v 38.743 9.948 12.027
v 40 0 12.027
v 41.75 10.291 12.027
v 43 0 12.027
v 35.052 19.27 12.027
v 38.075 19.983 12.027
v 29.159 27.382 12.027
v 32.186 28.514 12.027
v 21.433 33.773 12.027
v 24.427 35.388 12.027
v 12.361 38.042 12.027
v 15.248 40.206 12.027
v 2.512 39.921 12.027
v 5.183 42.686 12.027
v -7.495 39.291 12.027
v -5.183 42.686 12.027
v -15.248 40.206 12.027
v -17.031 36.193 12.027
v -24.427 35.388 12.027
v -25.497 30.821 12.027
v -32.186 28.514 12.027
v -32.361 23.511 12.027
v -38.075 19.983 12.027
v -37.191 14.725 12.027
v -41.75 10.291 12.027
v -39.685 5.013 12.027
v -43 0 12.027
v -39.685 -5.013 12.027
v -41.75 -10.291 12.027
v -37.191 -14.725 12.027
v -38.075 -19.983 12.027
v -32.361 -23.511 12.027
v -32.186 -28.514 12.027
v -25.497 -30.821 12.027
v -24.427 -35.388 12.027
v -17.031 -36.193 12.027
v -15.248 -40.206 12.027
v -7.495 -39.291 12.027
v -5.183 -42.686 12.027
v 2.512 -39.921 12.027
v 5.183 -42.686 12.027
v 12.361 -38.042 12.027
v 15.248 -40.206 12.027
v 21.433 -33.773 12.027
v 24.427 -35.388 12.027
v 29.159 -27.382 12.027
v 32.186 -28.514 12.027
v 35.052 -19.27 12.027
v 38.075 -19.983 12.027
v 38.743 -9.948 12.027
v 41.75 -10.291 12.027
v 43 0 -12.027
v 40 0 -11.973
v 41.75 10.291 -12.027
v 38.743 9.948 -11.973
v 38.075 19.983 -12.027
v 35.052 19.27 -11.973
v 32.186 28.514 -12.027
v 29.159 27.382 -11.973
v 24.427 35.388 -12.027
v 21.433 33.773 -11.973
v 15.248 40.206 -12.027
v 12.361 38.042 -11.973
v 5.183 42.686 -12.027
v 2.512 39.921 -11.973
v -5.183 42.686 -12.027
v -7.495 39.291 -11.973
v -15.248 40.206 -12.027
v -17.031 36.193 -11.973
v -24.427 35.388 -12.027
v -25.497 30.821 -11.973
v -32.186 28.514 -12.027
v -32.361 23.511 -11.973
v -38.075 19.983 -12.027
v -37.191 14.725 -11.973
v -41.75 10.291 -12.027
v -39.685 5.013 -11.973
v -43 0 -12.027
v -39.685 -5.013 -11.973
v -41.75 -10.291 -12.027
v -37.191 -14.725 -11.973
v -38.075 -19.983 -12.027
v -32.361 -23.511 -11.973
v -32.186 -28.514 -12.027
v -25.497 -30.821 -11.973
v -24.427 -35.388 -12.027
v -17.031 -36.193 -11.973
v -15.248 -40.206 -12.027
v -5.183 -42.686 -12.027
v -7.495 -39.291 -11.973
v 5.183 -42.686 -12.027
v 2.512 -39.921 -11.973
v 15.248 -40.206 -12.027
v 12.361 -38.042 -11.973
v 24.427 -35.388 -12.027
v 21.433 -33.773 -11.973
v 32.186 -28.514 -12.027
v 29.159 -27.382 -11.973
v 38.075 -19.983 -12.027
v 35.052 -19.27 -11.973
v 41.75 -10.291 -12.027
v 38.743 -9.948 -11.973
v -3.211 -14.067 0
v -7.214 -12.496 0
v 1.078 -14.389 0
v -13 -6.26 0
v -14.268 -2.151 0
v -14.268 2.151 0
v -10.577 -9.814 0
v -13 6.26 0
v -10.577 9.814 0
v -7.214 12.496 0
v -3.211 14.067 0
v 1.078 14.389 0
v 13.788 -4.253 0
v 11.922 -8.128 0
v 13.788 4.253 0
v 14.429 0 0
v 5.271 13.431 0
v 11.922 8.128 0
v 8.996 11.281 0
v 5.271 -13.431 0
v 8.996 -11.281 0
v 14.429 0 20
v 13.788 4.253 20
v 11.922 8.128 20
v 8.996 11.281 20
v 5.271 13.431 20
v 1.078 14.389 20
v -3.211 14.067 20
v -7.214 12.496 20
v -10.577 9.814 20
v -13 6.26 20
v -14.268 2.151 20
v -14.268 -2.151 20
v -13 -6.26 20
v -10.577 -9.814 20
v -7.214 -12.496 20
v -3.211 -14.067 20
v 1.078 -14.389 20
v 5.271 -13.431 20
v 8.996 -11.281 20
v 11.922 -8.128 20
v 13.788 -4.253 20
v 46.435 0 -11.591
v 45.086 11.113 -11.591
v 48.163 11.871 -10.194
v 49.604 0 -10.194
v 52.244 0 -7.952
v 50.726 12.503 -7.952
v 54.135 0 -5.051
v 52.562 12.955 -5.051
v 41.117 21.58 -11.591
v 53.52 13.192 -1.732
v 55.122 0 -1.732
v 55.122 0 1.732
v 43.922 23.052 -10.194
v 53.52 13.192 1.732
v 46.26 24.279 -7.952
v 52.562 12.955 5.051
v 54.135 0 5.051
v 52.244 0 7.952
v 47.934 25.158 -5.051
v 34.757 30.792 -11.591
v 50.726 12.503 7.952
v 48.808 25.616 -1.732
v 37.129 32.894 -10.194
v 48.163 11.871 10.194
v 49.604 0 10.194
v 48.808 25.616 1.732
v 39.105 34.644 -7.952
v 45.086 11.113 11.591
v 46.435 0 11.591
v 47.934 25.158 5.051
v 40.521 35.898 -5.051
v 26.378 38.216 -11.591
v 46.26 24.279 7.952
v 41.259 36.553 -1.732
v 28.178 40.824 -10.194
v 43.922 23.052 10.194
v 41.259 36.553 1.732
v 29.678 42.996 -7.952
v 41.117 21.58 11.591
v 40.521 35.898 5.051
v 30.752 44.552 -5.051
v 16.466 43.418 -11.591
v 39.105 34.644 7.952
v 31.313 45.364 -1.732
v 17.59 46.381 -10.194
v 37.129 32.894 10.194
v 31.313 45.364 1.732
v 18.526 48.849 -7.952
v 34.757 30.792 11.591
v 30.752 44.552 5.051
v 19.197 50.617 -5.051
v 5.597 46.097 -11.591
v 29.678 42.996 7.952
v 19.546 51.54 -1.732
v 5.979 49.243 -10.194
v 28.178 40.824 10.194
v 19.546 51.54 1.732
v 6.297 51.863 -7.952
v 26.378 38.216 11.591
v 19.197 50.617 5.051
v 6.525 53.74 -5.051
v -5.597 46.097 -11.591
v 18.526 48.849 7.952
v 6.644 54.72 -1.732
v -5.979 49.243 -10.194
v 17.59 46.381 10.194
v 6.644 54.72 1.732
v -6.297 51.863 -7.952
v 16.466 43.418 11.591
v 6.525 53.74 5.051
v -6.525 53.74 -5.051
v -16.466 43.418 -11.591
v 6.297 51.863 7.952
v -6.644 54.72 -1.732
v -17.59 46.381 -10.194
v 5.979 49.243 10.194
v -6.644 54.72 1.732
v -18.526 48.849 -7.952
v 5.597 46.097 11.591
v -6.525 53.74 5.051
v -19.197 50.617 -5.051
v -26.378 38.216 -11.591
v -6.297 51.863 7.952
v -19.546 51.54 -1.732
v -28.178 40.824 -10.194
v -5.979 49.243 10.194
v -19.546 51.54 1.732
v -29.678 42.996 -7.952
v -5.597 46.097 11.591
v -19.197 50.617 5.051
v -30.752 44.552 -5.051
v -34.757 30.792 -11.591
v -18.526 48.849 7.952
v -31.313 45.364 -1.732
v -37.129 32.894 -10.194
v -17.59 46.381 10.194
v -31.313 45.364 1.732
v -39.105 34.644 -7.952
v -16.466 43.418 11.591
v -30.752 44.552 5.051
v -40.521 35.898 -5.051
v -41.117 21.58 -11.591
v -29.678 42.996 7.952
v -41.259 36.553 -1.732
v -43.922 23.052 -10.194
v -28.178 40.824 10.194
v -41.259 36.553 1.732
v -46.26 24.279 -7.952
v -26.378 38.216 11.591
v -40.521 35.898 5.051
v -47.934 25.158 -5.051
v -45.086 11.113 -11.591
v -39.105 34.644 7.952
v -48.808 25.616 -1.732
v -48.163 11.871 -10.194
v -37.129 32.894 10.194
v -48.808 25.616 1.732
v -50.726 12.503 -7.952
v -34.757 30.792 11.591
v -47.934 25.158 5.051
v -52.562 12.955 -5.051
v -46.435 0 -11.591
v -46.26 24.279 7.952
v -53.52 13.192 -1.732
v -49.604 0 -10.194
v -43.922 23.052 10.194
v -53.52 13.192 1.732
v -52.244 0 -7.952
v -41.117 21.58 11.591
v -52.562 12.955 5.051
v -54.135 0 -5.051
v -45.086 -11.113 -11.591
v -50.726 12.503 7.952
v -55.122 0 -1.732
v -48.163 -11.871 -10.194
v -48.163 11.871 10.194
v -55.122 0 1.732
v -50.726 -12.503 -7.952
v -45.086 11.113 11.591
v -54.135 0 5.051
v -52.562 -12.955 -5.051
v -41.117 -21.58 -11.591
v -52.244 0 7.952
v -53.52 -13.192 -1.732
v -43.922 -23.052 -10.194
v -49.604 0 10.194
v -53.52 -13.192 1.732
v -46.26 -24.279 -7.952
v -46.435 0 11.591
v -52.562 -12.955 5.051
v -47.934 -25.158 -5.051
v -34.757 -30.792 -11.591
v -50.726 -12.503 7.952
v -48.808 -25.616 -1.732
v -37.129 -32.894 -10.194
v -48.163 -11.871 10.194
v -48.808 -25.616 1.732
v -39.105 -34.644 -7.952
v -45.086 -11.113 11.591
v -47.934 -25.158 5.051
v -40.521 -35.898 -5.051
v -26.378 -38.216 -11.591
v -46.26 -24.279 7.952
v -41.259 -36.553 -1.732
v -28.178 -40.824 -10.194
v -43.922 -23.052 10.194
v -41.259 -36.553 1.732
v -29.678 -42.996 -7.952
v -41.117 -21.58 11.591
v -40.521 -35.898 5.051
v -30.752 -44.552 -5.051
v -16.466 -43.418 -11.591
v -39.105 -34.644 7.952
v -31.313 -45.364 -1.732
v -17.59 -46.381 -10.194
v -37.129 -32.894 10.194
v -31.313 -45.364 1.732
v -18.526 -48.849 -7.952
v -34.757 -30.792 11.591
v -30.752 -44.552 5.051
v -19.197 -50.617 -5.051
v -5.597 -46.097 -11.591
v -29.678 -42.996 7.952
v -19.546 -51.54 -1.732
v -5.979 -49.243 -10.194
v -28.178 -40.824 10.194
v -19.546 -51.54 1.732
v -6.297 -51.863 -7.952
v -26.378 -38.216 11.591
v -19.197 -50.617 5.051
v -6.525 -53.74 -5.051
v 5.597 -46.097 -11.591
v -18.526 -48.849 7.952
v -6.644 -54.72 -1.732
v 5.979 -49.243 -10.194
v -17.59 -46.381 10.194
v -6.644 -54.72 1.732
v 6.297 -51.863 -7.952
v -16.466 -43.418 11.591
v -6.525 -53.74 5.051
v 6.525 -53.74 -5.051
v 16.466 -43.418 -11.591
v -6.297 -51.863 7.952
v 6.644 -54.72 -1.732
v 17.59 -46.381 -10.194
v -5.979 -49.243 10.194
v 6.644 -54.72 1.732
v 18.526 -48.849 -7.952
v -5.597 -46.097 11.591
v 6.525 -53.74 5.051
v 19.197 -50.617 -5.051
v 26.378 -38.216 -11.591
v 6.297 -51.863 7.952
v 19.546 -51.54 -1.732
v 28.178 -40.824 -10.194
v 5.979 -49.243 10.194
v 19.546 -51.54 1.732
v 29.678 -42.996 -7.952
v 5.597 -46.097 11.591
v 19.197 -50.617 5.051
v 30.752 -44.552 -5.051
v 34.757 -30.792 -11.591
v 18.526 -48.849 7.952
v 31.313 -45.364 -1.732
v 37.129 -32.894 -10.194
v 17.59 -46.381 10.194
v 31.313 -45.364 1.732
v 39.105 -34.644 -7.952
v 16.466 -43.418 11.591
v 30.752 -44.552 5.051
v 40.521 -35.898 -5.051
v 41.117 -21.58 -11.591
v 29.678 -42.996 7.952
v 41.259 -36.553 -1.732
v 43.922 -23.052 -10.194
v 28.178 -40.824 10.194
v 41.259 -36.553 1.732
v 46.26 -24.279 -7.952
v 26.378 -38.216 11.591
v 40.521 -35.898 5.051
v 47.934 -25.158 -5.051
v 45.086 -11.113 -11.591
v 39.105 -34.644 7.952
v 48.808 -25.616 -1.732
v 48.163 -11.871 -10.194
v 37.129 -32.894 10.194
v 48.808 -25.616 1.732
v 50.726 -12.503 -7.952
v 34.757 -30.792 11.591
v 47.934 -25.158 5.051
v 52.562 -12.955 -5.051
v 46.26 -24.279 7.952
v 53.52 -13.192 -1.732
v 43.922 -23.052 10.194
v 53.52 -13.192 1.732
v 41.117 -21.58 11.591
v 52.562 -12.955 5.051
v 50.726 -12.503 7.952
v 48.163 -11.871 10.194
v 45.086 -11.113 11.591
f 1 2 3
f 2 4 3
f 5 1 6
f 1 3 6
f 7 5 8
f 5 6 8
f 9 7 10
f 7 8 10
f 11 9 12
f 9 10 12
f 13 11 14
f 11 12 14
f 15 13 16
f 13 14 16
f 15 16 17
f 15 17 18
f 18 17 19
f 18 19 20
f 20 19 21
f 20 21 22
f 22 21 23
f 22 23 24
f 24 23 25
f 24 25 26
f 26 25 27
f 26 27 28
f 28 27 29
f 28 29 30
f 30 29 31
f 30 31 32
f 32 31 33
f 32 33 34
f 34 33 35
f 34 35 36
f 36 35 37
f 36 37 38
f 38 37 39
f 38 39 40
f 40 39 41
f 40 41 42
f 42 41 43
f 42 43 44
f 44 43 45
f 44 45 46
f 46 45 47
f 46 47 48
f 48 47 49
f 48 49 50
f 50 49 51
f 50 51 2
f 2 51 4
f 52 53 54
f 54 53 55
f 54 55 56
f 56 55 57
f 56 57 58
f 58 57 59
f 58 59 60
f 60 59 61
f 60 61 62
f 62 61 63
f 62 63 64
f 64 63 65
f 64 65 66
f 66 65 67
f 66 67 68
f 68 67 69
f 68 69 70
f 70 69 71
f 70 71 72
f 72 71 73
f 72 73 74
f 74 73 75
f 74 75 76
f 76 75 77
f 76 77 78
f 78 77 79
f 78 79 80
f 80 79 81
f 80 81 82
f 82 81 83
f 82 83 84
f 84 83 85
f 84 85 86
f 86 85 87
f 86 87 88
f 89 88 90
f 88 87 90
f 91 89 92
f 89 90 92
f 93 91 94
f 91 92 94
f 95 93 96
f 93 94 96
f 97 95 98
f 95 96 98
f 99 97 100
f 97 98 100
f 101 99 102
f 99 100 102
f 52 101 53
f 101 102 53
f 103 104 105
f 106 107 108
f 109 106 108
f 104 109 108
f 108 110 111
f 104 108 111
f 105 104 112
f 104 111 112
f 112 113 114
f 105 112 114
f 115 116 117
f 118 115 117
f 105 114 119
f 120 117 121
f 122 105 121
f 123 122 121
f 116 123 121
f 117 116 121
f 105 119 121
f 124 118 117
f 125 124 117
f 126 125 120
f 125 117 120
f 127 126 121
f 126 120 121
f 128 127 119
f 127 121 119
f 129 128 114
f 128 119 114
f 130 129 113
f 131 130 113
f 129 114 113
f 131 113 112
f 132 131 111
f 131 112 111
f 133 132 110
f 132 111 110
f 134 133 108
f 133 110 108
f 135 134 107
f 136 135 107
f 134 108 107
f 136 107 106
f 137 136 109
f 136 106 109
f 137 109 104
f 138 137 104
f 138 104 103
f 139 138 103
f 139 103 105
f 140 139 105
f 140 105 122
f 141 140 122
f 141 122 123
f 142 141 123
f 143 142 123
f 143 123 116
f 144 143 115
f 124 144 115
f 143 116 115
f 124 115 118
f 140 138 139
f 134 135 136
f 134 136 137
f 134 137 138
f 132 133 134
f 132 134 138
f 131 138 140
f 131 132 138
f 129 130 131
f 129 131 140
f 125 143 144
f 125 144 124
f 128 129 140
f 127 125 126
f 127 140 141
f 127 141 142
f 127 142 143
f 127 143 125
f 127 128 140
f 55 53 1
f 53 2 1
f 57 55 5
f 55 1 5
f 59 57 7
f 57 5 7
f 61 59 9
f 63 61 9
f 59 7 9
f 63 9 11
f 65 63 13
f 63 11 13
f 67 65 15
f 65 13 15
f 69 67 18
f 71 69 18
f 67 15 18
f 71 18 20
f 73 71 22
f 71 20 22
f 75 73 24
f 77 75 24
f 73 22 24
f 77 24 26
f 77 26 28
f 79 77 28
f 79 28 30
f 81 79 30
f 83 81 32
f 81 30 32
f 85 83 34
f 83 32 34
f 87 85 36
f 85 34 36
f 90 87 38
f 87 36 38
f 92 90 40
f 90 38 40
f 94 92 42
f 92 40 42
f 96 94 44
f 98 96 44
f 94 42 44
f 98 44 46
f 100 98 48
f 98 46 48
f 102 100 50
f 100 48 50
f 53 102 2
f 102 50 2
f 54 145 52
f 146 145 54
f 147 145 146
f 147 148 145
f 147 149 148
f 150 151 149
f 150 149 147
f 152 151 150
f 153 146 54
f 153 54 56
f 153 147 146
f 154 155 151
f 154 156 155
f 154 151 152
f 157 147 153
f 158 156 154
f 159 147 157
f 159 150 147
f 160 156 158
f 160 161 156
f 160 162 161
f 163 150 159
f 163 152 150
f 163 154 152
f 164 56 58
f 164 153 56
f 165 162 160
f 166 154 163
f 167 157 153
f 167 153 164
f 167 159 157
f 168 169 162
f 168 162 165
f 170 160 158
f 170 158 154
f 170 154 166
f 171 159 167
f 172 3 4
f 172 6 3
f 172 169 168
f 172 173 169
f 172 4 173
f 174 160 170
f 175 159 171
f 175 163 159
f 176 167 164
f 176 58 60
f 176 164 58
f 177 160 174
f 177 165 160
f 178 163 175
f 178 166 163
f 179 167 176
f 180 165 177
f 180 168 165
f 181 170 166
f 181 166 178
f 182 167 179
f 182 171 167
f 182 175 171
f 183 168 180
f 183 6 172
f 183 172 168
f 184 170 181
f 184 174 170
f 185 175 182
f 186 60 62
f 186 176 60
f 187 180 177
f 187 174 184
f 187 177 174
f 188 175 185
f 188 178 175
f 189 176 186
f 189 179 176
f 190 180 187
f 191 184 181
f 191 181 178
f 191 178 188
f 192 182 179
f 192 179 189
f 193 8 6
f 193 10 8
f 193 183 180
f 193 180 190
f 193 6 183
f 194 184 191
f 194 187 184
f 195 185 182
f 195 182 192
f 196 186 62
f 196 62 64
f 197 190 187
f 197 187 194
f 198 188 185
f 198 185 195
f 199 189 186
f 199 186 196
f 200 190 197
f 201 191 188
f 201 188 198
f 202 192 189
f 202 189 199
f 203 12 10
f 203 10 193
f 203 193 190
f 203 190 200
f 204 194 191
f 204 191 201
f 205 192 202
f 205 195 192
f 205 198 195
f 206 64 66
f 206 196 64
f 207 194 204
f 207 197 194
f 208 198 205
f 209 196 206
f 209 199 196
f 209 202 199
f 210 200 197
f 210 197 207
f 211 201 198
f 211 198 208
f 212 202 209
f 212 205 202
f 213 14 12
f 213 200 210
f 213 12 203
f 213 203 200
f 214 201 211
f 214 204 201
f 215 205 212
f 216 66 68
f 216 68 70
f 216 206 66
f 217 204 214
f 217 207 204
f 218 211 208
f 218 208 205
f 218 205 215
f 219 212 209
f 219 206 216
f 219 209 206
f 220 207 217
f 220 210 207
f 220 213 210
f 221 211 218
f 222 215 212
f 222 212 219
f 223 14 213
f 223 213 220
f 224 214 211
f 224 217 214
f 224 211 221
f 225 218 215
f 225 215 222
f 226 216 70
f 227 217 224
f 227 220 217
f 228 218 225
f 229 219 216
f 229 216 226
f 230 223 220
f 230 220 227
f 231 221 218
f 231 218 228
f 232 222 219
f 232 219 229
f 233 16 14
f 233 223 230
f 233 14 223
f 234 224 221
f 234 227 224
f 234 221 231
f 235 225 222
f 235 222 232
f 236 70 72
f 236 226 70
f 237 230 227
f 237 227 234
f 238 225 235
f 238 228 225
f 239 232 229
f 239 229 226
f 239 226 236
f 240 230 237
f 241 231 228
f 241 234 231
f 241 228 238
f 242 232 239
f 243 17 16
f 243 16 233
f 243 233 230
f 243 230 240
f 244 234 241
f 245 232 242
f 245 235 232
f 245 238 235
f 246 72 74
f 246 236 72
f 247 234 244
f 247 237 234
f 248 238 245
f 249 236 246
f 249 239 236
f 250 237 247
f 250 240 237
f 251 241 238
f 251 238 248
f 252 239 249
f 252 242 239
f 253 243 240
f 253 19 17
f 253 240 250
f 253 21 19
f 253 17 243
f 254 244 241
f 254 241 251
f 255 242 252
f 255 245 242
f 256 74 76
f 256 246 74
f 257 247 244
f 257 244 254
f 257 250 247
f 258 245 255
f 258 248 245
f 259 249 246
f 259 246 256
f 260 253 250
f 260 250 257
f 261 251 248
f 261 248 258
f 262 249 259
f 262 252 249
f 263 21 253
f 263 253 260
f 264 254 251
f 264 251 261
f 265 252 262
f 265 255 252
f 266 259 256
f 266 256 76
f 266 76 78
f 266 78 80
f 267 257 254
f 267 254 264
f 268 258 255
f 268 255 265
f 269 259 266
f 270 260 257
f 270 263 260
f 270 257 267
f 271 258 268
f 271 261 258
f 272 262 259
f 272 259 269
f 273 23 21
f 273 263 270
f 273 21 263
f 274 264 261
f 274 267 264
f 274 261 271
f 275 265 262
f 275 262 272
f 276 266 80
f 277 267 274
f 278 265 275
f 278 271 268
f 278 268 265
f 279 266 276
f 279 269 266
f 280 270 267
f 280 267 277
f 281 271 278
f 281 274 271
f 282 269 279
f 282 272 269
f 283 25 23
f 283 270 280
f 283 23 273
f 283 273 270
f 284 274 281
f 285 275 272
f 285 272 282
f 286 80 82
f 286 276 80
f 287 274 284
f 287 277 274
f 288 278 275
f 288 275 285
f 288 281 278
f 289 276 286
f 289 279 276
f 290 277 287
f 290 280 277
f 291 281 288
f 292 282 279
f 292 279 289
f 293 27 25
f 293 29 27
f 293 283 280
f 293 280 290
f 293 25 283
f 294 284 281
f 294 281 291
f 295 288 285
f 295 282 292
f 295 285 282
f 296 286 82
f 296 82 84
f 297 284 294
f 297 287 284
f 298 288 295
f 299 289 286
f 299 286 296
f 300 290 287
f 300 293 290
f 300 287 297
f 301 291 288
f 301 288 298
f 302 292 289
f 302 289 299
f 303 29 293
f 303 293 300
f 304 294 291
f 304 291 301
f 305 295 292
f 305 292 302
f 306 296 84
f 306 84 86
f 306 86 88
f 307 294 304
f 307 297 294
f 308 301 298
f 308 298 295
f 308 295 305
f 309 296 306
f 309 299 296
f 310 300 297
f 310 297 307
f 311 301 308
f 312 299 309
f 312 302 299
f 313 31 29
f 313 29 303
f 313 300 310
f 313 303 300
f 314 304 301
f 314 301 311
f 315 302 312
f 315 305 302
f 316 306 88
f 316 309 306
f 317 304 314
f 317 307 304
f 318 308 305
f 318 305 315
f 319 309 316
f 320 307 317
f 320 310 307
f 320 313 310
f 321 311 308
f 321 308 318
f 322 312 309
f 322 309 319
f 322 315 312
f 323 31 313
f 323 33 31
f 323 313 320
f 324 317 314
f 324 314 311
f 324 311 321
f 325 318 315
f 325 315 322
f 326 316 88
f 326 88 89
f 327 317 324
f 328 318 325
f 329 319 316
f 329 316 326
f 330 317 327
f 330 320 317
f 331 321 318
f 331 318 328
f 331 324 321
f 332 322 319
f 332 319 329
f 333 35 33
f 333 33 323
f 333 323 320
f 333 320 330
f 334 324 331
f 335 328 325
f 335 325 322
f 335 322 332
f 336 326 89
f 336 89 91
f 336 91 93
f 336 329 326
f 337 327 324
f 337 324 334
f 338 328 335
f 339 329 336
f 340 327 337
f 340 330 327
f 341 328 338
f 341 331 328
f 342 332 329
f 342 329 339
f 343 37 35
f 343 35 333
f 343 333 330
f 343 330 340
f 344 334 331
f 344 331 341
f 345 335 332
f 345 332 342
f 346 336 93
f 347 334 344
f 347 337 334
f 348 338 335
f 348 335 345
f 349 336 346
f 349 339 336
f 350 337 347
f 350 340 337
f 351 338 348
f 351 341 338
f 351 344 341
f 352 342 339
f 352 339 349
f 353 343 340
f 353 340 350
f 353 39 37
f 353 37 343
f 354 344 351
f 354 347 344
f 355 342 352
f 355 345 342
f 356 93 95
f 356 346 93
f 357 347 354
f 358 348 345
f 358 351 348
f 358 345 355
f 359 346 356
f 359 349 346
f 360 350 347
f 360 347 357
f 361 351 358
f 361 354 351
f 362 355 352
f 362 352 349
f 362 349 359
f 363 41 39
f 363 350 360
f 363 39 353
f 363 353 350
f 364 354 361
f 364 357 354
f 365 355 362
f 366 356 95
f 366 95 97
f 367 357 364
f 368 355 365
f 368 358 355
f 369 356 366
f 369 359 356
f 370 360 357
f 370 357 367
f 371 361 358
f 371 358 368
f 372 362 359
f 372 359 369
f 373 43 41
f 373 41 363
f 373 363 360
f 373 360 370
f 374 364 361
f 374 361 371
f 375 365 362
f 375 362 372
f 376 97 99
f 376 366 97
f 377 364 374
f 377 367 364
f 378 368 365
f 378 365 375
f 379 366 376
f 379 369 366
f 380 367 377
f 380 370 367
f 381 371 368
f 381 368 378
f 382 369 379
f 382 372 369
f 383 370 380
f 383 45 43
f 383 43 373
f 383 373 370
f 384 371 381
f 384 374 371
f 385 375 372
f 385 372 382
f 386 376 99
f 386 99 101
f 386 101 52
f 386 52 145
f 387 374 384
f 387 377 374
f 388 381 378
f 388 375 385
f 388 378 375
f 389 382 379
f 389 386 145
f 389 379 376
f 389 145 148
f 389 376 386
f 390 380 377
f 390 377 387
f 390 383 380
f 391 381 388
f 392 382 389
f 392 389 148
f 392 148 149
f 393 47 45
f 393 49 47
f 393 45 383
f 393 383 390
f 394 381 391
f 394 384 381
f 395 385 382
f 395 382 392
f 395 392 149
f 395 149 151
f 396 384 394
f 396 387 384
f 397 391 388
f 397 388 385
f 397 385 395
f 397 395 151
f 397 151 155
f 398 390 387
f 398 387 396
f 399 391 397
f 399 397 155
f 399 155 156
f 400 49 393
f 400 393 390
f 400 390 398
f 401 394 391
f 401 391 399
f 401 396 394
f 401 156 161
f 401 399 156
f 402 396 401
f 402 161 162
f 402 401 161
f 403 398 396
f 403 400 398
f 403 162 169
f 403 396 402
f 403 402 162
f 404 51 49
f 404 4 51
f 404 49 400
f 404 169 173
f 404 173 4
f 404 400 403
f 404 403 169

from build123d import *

# Parameters (mm, degrees)
F3_R     = 14.4288800287
F4_DEPTH = 20


# Not quite as in the source:
# - the program builds the solid bodies; features that only make, move or delete a surface that nothing else refers to are left out


with BuildPart() as f2:
    # F2: sweep along a path in F0
    with BuildLine(Plane.XY) as f2_path:
        CenterArc((0, 0), 40, 0, 360)
    # F1 (on Front) → F2 (sweep)
    with BuildSketch(Plane.XZ):
        with BuildLine():
            Line((-40, 12.0271782488), (-43, 12.0271782488))
            ThreePointArc((-43, 12.0271782488), (-55.2470707288, 0), (-43, -12.0271782488))
            Line((-43, -12.0271782488), (-40, -11.9728217512))
            Line((-40, -11.9728217512), (-40, 12.0271782488))
        make_face()
    sweep(path=f2_path.line)


with BuildPart() as f4:
    # F3 (on Top) → F4 (new body)
    with BuildSketch(Plane.XY):
        Circle(F3_R)
    extrude(amount=F4_DEPTH)


solid = Compound([f2.part, f4.part])
